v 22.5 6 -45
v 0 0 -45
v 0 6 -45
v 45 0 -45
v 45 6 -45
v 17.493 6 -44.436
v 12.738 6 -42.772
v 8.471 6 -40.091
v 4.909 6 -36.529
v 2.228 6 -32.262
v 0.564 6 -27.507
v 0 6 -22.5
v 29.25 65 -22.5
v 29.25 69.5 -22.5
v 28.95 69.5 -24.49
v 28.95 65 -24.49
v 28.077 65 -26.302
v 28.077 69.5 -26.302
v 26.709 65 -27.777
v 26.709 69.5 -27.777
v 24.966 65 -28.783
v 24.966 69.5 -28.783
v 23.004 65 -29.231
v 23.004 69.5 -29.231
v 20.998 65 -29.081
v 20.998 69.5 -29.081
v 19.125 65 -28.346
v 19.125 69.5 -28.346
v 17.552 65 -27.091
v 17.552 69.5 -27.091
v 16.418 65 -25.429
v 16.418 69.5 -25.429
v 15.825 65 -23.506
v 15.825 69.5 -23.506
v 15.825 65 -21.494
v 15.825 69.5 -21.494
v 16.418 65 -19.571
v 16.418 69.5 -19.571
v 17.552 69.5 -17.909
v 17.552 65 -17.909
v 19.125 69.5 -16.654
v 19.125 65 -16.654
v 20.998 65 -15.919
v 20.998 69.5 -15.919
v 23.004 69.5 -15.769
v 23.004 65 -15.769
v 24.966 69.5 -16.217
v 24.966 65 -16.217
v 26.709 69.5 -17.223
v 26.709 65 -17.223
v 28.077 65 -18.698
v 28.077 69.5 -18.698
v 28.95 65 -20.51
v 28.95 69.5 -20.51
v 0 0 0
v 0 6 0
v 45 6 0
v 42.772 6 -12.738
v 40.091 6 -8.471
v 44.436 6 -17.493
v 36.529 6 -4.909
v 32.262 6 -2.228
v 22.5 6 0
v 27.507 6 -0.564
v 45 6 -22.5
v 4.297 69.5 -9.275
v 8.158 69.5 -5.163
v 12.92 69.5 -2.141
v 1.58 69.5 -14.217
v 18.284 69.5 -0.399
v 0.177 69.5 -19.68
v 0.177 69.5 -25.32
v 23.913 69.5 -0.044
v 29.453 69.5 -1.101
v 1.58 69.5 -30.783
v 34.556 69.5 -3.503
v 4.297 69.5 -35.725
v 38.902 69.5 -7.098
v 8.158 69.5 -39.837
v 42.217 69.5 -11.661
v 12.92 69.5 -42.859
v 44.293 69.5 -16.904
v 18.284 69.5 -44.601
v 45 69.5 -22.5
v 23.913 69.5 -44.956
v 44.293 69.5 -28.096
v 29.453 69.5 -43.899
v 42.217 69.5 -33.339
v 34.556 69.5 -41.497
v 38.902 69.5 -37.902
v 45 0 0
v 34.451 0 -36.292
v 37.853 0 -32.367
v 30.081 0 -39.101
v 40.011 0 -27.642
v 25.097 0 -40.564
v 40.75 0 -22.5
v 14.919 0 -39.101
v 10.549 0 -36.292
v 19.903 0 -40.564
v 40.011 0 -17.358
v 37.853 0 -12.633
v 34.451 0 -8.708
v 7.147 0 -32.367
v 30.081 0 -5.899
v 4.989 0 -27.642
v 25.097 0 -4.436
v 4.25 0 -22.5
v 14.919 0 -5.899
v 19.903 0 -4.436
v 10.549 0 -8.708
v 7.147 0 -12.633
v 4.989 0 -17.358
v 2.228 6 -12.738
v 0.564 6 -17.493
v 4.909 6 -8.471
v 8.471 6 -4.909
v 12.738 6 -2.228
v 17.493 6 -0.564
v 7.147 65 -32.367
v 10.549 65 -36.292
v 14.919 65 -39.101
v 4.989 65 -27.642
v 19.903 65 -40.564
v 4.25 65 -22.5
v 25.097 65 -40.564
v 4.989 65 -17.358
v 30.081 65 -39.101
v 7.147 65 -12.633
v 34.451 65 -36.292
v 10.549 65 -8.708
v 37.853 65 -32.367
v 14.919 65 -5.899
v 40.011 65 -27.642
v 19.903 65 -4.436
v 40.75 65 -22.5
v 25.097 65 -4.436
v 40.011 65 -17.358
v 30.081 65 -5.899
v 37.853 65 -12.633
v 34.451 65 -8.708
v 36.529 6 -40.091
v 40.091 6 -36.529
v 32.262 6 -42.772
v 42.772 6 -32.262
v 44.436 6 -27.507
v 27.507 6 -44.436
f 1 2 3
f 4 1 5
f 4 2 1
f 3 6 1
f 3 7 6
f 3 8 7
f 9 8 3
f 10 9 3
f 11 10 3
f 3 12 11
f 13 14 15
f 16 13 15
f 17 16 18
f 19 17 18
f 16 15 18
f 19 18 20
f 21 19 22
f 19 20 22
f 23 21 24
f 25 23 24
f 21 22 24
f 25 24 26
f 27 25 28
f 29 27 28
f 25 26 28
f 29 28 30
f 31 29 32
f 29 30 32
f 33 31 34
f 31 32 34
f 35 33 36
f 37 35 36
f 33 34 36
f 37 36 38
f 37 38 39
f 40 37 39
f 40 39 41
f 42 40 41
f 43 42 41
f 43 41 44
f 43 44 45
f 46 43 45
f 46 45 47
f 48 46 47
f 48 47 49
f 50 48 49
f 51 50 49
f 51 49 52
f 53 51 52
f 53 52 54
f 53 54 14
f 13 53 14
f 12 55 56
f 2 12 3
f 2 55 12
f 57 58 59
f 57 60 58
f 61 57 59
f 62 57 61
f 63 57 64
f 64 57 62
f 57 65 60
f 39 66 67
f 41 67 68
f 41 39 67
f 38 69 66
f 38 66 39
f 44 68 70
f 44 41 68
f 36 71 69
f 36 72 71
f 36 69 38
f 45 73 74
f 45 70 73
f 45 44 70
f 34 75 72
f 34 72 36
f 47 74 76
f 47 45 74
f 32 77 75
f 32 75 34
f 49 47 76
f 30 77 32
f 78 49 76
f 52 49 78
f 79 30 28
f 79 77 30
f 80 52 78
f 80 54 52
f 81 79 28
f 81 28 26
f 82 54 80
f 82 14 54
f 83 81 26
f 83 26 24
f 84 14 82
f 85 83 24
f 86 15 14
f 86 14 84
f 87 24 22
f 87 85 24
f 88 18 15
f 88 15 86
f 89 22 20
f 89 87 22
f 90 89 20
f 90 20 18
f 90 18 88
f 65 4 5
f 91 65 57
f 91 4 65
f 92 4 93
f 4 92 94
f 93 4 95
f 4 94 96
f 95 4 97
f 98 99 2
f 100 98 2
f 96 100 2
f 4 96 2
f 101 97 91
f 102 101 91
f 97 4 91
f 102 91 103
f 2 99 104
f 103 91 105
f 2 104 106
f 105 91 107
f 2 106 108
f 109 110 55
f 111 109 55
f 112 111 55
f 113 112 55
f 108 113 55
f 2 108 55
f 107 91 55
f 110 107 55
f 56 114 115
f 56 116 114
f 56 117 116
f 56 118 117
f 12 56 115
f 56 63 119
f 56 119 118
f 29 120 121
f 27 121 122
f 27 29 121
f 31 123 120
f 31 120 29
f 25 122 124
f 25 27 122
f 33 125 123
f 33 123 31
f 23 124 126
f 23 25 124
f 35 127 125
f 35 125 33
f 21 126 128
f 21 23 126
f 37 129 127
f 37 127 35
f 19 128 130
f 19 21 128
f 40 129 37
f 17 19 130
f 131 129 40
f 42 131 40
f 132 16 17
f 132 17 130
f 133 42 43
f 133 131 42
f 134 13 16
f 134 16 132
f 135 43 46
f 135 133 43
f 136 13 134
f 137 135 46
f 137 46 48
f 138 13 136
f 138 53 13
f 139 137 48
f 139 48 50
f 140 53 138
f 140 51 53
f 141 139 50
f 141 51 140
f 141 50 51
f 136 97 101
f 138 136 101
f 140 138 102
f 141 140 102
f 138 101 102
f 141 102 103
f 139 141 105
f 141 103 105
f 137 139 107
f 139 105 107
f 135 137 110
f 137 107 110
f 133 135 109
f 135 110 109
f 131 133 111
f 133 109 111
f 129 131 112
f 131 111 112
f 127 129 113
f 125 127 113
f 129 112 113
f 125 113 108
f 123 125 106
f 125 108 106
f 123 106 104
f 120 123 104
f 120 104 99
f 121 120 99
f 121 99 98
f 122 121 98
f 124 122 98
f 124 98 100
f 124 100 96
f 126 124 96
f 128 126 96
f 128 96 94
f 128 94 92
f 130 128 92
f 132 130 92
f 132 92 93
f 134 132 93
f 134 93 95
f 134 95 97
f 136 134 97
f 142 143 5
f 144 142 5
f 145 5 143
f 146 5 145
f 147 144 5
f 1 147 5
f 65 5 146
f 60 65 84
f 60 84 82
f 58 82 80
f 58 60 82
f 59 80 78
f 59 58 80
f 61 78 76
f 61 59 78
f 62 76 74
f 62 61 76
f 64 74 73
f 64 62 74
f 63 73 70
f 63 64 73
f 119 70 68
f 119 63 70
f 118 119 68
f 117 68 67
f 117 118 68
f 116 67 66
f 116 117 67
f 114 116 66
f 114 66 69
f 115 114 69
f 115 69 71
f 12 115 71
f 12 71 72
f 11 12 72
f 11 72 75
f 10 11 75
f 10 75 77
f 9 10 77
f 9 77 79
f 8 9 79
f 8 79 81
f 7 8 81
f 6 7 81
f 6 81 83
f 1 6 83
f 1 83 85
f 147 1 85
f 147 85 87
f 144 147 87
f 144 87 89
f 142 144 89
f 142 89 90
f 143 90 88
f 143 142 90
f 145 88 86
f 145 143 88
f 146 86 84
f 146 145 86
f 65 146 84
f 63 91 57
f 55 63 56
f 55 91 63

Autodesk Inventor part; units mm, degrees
ref_plane "YZ Plane" through (0, 0, 0) normal (1, 0, 0) x (0, 1, 0)
ref_plane "XZ Plane" through (0, 0, 0) normal (0, 1, 0) x (-1, 0, 0)
ref_plane "XY Plane" through (0, 0, 0) normal (0, 0, 1) x (1, 0, 0)
sketch "Sketch1" plane through (0, 0, 0) normal (0, 1, 0) x (-1, 0, 0)
  line L0 (0, 0) -> (0, -45)
  line L1 (0, -45) -> (-45, -45)
  line L2 (-45, -45) -> (-45, 0)
  line L3 (-45, 0) -> (0, 0)
  dimension "d0" = 45
  dimension "d1" = 45
  dimension "d2" = 45
extrude "Extrusion1" add sketch "Sketch1" along normal blind 6
sketch "Sketch2" plane through (0, 6, 0) normal (0, 1, 0) x (1, 0, 0)
  line L0 (0, 0) -> (0, 22.5)
  line L1 (0, 45) -> (0, 0) projected
  line L2 (0, 22.5) -> (22.5, 22.5)
  circle A0 centre (22.5, 22.5) radius 22.5
  dimension "d5" = 22.5
  dimension "d6" = 22.5
  dimension "d7" = 45
extrude "Extrusion2" add sketch "Sketch2" along normal blind 63.5
sketch "Sketch3" plane through (0, 0, 0) normal (0, -1, 0) x (1, 0, 0)
  line L0 (0, -45) -> (0, 0) projected
  line L1 (0, 0) -> (0, -22.5)
  circle A0 centre (22.5, -22.5) radius 18.25
  dimension "d12" = 36.5
extrude "Extrusion3" cut sketch "Sketch3" against normal blind 65
sketch "Sketch4" plane through (22.5, 69.5, -22.5) normal (0, 1, 0) x (1, 0, 0)
  circle A0 centre (0, 0) radius 6.75
  point P0 (-22.5, -22.5)
  dimension "d15" = 13.5
extrude "Extrusion4" cut sketch "Sketch4" against normal blind 4.5
sketch "Sketch5" plane through (0, 0, 0) normal (0, -1, 0) x (1, 0, 0)
  line L0 (0, -45) -> (0, 0) projected
  line L1 (0, 0) -> (22.5, 0)
  line L2 (0, 0) -> (45, 0) projected
sketch "Sketch6" plane through (22.5, 65, -22.5) normal (0, -1, 0) x (1, 0, 0)
  point P0 (-22.5, 22.5)
properties part number "MotorSupport"
